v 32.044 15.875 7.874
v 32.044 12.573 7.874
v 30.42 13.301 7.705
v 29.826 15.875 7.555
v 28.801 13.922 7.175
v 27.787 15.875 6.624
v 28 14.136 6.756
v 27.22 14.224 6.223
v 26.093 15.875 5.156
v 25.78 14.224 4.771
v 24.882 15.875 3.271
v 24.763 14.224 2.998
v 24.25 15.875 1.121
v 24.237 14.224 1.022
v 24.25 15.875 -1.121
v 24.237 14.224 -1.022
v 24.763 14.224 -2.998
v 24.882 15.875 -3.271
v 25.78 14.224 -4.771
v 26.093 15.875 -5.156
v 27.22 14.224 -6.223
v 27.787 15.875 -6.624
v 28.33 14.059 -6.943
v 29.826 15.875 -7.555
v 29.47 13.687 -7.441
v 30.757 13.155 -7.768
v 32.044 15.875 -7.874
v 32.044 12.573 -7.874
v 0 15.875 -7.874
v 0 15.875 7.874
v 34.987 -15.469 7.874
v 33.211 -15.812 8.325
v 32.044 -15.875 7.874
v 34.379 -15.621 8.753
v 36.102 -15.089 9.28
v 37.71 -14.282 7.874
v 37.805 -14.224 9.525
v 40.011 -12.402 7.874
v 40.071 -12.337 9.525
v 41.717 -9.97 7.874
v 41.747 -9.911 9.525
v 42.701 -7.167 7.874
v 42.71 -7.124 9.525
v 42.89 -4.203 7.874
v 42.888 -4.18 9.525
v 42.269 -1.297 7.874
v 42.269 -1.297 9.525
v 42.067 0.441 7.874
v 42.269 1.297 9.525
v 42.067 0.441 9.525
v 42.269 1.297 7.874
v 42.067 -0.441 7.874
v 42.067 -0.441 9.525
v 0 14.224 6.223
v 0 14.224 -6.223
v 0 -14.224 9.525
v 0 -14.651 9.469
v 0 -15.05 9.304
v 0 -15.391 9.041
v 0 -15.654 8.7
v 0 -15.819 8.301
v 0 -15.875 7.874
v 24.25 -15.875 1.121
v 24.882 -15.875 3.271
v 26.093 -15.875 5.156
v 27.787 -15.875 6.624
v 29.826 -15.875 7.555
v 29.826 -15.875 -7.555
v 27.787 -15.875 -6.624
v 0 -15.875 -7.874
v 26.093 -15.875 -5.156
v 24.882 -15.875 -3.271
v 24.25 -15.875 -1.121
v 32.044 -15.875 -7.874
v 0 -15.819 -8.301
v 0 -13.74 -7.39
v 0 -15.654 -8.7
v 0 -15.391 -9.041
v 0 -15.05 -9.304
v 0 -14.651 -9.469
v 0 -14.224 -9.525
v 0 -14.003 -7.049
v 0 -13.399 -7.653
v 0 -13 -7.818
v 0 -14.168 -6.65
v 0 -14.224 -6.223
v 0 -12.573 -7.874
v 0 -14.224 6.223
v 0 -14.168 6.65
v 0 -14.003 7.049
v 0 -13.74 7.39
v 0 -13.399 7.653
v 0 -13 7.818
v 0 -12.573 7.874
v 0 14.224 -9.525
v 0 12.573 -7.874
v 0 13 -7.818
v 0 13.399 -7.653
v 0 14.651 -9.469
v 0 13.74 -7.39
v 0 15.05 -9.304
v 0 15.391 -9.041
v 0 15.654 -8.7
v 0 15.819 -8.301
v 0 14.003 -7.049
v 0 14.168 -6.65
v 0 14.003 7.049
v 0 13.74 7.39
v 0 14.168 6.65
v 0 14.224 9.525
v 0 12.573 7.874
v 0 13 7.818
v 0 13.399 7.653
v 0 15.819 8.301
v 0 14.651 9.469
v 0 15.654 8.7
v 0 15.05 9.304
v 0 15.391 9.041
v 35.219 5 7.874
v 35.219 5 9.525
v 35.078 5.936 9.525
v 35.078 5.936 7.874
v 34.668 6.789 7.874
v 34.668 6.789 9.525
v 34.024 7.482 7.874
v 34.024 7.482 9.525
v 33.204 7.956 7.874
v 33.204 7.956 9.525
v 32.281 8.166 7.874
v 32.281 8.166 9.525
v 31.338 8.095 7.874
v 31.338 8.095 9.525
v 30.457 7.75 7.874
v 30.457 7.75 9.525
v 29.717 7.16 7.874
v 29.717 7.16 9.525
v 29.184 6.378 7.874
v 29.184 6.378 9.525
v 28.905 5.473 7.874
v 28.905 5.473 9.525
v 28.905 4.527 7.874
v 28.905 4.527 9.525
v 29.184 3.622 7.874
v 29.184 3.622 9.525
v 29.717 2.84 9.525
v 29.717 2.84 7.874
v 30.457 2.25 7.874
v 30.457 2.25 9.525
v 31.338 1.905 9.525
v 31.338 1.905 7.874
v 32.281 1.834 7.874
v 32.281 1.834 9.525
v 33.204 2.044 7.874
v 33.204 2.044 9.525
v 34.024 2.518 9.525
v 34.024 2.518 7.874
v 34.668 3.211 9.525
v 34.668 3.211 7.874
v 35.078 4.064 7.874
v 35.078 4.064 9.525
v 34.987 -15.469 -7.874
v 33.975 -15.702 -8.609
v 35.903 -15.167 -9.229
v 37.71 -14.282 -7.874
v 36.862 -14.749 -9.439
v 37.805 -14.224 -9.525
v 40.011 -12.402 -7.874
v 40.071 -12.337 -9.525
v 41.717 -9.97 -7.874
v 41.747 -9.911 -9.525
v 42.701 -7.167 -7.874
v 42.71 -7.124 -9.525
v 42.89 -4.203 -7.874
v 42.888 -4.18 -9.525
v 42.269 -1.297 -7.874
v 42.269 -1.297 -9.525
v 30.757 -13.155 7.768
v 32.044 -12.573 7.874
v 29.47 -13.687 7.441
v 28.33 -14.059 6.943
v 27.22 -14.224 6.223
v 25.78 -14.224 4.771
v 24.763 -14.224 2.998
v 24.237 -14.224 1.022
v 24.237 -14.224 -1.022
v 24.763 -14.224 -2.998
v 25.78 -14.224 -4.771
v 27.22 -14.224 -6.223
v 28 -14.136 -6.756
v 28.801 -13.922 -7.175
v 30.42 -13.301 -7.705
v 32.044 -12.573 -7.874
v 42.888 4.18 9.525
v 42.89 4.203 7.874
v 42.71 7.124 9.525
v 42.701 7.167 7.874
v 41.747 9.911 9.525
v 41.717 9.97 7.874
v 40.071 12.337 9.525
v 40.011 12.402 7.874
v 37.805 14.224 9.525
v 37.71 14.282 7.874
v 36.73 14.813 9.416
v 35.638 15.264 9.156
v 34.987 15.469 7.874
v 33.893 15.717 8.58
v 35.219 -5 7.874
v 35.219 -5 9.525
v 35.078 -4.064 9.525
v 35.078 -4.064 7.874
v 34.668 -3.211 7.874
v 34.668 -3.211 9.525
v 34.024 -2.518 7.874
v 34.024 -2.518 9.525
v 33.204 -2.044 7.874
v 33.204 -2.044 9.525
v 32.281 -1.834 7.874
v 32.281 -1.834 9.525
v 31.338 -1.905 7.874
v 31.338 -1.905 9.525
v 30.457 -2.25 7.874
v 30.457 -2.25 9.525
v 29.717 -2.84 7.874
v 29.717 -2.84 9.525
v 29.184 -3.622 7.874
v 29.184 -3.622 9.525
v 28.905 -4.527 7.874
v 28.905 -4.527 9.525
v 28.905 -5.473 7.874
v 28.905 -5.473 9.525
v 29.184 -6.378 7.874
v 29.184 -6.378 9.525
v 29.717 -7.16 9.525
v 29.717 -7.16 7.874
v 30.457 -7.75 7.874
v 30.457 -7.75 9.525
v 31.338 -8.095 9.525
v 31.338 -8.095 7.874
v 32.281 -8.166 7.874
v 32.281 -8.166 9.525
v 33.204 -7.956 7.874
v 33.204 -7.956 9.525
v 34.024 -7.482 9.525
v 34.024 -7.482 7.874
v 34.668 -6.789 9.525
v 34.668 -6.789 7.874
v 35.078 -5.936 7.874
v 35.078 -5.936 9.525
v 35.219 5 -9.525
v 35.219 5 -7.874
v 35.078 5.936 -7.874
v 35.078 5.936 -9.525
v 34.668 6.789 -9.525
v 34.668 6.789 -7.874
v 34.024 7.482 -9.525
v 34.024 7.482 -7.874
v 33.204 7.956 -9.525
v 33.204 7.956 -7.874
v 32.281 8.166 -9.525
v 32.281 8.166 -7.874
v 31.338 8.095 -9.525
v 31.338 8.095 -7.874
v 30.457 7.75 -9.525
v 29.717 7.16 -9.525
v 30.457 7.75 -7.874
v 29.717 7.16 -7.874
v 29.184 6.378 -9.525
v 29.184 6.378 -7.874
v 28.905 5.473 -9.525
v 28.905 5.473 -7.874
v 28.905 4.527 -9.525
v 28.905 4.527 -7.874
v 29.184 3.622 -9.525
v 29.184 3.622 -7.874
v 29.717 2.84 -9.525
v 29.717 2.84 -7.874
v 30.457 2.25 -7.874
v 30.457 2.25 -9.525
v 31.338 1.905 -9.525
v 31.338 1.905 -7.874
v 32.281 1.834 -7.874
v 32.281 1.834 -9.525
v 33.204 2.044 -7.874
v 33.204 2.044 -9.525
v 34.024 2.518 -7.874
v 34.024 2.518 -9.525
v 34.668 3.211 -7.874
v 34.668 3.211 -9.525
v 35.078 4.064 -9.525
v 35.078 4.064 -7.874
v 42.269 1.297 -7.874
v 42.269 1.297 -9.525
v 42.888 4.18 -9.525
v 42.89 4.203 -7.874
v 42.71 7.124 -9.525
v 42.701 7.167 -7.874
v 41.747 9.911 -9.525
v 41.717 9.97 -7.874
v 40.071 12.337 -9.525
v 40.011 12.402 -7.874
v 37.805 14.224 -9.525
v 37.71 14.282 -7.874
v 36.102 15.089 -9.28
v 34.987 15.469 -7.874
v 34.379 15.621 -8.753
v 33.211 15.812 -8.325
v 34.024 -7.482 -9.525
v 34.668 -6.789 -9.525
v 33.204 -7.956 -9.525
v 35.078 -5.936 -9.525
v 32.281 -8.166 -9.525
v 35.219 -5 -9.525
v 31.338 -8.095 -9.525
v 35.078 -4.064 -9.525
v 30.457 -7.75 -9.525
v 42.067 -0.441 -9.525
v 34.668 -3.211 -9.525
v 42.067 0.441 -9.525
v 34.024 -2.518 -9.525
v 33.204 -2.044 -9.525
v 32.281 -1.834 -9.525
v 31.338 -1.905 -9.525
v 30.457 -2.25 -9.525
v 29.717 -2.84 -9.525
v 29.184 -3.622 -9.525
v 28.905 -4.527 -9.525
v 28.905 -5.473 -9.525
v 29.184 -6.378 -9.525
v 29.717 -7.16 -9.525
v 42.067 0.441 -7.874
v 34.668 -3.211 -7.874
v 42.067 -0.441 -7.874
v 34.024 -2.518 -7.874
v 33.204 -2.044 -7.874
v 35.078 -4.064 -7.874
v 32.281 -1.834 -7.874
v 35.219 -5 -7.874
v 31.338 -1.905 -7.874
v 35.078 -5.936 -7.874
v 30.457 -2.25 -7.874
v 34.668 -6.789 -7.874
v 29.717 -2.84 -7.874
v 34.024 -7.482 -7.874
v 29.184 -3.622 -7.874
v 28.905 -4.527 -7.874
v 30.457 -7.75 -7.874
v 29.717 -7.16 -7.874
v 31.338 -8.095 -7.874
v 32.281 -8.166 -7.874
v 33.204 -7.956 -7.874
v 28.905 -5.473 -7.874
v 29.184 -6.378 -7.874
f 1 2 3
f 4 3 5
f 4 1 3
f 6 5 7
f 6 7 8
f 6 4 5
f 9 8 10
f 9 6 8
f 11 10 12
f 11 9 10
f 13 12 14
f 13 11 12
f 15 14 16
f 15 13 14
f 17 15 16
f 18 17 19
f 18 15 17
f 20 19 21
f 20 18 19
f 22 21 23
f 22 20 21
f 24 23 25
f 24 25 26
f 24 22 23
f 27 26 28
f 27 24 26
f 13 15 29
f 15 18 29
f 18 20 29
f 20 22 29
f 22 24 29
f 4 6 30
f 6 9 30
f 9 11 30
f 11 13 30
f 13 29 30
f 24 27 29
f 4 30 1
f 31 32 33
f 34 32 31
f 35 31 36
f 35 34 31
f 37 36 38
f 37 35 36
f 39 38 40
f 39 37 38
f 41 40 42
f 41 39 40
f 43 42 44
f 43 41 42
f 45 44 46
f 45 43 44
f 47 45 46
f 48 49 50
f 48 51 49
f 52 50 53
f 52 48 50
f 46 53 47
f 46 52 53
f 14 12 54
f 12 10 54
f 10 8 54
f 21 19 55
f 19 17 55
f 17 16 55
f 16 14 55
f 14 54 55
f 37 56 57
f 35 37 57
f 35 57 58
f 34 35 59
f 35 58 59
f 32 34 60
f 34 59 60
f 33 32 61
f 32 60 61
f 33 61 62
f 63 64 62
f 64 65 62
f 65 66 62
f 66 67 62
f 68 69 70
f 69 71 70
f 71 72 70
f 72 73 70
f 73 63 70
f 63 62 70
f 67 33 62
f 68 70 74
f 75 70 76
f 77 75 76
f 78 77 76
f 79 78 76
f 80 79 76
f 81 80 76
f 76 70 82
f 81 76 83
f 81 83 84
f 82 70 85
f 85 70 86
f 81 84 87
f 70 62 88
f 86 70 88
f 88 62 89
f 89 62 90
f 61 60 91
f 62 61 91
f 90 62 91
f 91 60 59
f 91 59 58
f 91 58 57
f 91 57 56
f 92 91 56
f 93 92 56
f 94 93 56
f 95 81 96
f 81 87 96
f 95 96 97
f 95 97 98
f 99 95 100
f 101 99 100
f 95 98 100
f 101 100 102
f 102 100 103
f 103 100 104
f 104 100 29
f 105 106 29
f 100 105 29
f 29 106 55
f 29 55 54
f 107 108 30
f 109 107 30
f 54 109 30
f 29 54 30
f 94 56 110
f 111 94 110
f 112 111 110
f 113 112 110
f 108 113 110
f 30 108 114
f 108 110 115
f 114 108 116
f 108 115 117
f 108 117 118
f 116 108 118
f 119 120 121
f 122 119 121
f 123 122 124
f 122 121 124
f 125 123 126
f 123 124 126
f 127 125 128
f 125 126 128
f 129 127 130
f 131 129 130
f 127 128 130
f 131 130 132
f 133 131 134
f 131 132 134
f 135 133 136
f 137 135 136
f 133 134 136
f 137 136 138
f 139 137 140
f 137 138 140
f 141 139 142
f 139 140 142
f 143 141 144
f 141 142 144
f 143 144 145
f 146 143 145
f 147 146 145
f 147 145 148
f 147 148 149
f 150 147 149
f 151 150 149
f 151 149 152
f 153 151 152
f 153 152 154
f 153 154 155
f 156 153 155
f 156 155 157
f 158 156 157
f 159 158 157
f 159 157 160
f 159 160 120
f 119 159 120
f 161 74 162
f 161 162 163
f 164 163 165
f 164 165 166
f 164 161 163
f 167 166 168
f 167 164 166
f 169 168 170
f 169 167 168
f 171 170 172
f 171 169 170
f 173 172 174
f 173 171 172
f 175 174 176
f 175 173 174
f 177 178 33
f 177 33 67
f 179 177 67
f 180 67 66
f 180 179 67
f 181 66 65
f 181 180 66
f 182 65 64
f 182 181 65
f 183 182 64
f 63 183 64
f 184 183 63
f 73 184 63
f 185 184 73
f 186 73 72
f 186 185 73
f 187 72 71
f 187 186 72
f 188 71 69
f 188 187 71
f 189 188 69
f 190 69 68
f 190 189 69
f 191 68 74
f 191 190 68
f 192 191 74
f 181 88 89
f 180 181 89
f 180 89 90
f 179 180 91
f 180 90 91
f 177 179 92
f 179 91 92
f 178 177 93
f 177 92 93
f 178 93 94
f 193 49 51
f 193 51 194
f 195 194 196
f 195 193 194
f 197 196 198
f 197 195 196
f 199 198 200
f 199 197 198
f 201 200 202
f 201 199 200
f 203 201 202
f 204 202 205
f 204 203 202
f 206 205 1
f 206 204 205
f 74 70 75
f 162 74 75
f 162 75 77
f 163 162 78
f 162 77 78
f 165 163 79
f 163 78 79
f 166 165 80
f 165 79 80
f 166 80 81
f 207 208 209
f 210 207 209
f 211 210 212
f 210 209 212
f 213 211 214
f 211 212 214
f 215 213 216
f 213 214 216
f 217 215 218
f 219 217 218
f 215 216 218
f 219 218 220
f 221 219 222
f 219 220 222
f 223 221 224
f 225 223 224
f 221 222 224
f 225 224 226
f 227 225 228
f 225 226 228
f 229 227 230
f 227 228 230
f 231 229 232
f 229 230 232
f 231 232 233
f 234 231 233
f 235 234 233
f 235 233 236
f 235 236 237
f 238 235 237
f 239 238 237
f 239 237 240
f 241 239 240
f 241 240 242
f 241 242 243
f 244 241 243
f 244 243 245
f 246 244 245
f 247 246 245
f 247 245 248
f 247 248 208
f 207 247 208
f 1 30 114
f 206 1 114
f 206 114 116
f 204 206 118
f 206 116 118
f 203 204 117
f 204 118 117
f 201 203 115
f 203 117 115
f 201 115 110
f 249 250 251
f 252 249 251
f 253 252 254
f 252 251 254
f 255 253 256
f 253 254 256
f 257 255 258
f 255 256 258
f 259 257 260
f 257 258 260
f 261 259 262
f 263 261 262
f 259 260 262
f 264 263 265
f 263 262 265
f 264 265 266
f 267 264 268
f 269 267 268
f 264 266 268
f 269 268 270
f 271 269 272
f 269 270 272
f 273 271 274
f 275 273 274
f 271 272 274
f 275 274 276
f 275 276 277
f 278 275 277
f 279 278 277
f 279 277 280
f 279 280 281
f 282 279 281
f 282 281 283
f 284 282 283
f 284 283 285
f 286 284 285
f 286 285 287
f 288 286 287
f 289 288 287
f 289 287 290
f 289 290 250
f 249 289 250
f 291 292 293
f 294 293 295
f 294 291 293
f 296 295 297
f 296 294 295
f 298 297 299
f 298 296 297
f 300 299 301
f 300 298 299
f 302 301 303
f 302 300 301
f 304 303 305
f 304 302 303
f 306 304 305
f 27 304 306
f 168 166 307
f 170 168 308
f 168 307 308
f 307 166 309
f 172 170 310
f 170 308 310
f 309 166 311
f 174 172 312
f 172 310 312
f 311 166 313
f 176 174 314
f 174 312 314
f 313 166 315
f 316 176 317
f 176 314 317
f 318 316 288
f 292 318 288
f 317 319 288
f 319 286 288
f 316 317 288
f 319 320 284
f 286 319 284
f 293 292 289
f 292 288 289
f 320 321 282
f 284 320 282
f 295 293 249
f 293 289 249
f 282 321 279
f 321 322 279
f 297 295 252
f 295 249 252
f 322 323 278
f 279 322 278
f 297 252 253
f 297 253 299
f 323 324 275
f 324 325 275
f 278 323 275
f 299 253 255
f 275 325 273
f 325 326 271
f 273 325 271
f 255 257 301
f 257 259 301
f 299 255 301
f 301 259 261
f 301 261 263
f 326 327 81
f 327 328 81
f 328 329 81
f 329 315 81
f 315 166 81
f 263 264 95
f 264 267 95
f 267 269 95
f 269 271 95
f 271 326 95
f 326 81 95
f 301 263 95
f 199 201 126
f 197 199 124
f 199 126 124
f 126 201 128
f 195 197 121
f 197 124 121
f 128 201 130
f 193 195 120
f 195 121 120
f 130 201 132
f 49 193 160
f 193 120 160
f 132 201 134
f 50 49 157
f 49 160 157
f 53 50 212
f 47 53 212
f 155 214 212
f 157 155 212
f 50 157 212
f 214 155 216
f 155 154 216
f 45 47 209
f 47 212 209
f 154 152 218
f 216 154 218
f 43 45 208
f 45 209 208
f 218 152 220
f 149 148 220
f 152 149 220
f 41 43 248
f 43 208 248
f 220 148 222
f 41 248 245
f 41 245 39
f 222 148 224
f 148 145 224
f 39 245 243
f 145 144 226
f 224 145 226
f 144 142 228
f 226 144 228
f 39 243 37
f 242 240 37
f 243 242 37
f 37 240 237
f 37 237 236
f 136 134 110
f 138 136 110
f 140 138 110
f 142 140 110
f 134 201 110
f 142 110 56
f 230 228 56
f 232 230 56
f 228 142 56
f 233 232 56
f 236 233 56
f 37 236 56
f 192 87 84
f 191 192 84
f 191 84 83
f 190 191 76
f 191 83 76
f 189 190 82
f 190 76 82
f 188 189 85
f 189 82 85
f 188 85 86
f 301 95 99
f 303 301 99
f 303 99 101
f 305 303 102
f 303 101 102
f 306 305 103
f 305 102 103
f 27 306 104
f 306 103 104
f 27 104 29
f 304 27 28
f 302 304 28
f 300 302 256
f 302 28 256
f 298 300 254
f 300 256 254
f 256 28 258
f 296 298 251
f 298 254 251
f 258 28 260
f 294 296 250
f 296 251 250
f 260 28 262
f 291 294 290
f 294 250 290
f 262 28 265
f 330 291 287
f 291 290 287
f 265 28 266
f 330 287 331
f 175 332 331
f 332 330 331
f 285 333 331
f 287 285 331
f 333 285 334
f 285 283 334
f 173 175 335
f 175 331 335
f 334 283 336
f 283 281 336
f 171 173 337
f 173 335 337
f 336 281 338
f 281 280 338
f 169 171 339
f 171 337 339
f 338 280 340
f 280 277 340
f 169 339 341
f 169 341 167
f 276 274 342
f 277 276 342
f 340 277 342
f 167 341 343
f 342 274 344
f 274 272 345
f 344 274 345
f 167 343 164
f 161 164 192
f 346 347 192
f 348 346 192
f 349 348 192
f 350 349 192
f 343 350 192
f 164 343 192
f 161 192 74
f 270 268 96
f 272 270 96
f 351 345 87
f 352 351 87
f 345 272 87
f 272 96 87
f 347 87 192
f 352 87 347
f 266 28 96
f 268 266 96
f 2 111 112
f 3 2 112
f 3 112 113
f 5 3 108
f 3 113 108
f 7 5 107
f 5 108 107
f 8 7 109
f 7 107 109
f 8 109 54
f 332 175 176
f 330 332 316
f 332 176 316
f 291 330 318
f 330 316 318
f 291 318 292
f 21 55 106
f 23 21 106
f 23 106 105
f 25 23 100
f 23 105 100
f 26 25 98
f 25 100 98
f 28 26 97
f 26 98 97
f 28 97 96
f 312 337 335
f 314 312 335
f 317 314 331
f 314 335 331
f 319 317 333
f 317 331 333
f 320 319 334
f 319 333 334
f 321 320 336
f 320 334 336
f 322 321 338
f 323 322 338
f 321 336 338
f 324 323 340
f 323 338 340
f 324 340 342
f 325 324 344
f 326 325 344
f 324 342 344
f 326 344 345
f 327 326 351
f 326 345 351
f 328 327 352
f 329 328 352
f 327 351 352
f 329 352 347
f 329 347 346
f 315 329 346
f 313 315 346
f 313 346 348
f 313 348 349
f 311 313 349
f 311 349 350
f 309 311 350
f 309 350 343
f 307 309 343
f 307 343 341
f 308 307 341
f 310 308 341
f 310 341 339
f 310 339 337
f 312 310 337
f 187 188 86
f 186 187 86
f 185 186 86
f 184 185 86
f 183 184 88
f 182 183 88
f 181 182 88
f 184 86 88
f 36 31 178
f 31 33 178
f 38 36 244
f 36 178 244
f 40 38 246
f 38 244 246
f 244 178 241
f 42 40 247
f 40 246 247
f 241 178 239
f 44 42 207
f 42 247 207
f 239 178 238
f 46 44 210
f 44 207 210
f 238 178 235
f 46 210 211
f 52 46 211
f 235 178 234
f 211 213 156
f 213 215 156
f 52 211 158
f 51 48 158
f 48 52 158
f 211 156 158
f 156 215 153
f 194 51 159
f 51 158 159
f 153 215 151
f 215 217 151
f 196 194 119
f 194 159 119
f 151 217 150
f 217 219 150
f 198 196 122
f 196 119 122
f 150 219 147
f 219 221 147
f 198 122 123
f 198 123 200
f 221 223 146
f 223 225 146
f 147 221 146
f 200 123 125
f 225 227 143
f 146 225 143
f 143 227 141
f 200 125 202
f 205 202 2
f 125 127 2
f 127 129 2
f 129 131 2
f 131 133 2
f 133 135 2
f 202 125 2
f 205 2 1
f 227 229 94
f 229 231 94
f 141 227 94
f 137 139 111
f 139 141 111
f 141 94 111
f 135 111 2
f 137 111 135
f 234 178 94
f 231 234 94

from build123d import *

# Parameters (mm, degrees)
SQUARE_TUBE_1_5X0_75_0_065_4130_TUBE_1_DEPTH = 43.474215441
SKETCH3_R                                    = 3.175
CUT_EXTRUDE1_DEPTH                           = 51.049231095
CUT_EXTRUDE2_DEPTH                           = 55.229578607
FILLET1_R                                    = 3.81


with BuildPart() as part:
    # Sketch2 → Square tube 1.5X0.75-0.065 4130 TUBE(1) (new body)
    with BuildSketch(Plane.YZ):
        with BuildLine():
            Line((-14.224, -9.525), (14.224, -9.525))
            ThreePointArc((14.224, -9.525), (15.391433296, -9.041433296), (15.875, -7.874))
            Line((15.875, -7.874), (15.875, 7.874))
            ThreePointArc((15.875, 7.874), (15.391433296, 9.041433296), (14.224, 9.525))
            Line((14.224, 9.525), (-14.224, 9.525))
            ThreePointArc((-14.224, 9.525), (-15.391433296, 9.041433296), (-15.875, 7.874))
            Line((-15.875, 7.874), (-15.875, -7.874))
            ThreePointArc((-15.875, -7.874), (-15.391433296, -9.041433296), (-14.224, -9.525))
        make_face()
        with BuildLine():
            Line((-12.573, 7.874), (12.573, 7.874))
            ThreePointArc((12.573, 7.874), (13.740433296, 7.390433296), (14.224, 6.223))
            Line((14.224, 6.223), (14.224, -6.223))
            ThreePointArc((14.224, -6.223), (13.740433296, -7.390433296), (12.573, -7.874))
            Line((12.573, -7.874), (-12.573, -7.874))
            ThreePointArc((-12.573, -7.874), (-13.740433296, -7.390433296), (-14.224, -6.223))
            Line((-14.224, -6.223), (-14.224, 6.223))
            ThreePointArc((-14.224, 6.223), (-13.740433296, 7.390433296), (-12.573, 7.874))
        make_face(mode=Mode.SUBTRACT)
    extrude(amount=SQUARE_TUBE_1_5X0_75_0_065_4130_TUBE_1_DEPTH)

    # Sketch3 → Cut-Extrude1 (cut, through all)
    with BuildSketch(Plane.XY.offset(9.525)):
        with Locations((32.044215441, 5)):
            Circle(SKETCH3_R)
        with Locations((32.044215441, -5)):
            Circle(SKETCH3_R)
        with BuildLine():
            Line((43.474215441, -15.875), (32.044215441, -15.875))
            ThreePointArc((32.044215441, -15.875), (41.335087978, -10.652018445), (41.701628397, 0))
            ThreePointArc((41.701628397, 0), (41.335087978, 10.652018445), (32.044215441, 15.875))
            Line((32.044215441, 15.875), (43.474215441, 15.875))
            Line((43.474215441, 15.875), (43.474215441, -15.875))
        make_face()
    extrude(amount=-CUT_EXTRUDE1_DEPTH, mode=Mode.SUBTRACT)

    # Sketch4 → Cut-Extrude2 (cut, through all)
    with BuildSketch(Plane(origin=(0, 15.875, 0), x_dir=(1, 0, 0), z_dir=(0, 1, 0))):
        with BuildLine():
            Line((39.849040615, -7.874), (32.044215441, -7.874))
            ThreePointArc((32.044215441, -7.874), (24.170215441, 0), (32.044215441, 7.874))
            Line((32.044215441, 7.874), (39.849040615, 7.874))
            Line((39.849040615, 7.874), (39.849040615, -7.874))
        make_face()
    extrude(amount=-CUT_EXTRUDE2_DEPTH, mode=Mode.SUBTRACT)

    # Fillet1
    fillet1_edges = [part.edges().sort_by_distance(p)[0] for p in [
        (41.701628397, 0, -8.6995),
        (41.701628397, 0, 8.6995),
    ]]
    fillet(fillet1_edges, radius=FILLET1_R)


solid = part.part
